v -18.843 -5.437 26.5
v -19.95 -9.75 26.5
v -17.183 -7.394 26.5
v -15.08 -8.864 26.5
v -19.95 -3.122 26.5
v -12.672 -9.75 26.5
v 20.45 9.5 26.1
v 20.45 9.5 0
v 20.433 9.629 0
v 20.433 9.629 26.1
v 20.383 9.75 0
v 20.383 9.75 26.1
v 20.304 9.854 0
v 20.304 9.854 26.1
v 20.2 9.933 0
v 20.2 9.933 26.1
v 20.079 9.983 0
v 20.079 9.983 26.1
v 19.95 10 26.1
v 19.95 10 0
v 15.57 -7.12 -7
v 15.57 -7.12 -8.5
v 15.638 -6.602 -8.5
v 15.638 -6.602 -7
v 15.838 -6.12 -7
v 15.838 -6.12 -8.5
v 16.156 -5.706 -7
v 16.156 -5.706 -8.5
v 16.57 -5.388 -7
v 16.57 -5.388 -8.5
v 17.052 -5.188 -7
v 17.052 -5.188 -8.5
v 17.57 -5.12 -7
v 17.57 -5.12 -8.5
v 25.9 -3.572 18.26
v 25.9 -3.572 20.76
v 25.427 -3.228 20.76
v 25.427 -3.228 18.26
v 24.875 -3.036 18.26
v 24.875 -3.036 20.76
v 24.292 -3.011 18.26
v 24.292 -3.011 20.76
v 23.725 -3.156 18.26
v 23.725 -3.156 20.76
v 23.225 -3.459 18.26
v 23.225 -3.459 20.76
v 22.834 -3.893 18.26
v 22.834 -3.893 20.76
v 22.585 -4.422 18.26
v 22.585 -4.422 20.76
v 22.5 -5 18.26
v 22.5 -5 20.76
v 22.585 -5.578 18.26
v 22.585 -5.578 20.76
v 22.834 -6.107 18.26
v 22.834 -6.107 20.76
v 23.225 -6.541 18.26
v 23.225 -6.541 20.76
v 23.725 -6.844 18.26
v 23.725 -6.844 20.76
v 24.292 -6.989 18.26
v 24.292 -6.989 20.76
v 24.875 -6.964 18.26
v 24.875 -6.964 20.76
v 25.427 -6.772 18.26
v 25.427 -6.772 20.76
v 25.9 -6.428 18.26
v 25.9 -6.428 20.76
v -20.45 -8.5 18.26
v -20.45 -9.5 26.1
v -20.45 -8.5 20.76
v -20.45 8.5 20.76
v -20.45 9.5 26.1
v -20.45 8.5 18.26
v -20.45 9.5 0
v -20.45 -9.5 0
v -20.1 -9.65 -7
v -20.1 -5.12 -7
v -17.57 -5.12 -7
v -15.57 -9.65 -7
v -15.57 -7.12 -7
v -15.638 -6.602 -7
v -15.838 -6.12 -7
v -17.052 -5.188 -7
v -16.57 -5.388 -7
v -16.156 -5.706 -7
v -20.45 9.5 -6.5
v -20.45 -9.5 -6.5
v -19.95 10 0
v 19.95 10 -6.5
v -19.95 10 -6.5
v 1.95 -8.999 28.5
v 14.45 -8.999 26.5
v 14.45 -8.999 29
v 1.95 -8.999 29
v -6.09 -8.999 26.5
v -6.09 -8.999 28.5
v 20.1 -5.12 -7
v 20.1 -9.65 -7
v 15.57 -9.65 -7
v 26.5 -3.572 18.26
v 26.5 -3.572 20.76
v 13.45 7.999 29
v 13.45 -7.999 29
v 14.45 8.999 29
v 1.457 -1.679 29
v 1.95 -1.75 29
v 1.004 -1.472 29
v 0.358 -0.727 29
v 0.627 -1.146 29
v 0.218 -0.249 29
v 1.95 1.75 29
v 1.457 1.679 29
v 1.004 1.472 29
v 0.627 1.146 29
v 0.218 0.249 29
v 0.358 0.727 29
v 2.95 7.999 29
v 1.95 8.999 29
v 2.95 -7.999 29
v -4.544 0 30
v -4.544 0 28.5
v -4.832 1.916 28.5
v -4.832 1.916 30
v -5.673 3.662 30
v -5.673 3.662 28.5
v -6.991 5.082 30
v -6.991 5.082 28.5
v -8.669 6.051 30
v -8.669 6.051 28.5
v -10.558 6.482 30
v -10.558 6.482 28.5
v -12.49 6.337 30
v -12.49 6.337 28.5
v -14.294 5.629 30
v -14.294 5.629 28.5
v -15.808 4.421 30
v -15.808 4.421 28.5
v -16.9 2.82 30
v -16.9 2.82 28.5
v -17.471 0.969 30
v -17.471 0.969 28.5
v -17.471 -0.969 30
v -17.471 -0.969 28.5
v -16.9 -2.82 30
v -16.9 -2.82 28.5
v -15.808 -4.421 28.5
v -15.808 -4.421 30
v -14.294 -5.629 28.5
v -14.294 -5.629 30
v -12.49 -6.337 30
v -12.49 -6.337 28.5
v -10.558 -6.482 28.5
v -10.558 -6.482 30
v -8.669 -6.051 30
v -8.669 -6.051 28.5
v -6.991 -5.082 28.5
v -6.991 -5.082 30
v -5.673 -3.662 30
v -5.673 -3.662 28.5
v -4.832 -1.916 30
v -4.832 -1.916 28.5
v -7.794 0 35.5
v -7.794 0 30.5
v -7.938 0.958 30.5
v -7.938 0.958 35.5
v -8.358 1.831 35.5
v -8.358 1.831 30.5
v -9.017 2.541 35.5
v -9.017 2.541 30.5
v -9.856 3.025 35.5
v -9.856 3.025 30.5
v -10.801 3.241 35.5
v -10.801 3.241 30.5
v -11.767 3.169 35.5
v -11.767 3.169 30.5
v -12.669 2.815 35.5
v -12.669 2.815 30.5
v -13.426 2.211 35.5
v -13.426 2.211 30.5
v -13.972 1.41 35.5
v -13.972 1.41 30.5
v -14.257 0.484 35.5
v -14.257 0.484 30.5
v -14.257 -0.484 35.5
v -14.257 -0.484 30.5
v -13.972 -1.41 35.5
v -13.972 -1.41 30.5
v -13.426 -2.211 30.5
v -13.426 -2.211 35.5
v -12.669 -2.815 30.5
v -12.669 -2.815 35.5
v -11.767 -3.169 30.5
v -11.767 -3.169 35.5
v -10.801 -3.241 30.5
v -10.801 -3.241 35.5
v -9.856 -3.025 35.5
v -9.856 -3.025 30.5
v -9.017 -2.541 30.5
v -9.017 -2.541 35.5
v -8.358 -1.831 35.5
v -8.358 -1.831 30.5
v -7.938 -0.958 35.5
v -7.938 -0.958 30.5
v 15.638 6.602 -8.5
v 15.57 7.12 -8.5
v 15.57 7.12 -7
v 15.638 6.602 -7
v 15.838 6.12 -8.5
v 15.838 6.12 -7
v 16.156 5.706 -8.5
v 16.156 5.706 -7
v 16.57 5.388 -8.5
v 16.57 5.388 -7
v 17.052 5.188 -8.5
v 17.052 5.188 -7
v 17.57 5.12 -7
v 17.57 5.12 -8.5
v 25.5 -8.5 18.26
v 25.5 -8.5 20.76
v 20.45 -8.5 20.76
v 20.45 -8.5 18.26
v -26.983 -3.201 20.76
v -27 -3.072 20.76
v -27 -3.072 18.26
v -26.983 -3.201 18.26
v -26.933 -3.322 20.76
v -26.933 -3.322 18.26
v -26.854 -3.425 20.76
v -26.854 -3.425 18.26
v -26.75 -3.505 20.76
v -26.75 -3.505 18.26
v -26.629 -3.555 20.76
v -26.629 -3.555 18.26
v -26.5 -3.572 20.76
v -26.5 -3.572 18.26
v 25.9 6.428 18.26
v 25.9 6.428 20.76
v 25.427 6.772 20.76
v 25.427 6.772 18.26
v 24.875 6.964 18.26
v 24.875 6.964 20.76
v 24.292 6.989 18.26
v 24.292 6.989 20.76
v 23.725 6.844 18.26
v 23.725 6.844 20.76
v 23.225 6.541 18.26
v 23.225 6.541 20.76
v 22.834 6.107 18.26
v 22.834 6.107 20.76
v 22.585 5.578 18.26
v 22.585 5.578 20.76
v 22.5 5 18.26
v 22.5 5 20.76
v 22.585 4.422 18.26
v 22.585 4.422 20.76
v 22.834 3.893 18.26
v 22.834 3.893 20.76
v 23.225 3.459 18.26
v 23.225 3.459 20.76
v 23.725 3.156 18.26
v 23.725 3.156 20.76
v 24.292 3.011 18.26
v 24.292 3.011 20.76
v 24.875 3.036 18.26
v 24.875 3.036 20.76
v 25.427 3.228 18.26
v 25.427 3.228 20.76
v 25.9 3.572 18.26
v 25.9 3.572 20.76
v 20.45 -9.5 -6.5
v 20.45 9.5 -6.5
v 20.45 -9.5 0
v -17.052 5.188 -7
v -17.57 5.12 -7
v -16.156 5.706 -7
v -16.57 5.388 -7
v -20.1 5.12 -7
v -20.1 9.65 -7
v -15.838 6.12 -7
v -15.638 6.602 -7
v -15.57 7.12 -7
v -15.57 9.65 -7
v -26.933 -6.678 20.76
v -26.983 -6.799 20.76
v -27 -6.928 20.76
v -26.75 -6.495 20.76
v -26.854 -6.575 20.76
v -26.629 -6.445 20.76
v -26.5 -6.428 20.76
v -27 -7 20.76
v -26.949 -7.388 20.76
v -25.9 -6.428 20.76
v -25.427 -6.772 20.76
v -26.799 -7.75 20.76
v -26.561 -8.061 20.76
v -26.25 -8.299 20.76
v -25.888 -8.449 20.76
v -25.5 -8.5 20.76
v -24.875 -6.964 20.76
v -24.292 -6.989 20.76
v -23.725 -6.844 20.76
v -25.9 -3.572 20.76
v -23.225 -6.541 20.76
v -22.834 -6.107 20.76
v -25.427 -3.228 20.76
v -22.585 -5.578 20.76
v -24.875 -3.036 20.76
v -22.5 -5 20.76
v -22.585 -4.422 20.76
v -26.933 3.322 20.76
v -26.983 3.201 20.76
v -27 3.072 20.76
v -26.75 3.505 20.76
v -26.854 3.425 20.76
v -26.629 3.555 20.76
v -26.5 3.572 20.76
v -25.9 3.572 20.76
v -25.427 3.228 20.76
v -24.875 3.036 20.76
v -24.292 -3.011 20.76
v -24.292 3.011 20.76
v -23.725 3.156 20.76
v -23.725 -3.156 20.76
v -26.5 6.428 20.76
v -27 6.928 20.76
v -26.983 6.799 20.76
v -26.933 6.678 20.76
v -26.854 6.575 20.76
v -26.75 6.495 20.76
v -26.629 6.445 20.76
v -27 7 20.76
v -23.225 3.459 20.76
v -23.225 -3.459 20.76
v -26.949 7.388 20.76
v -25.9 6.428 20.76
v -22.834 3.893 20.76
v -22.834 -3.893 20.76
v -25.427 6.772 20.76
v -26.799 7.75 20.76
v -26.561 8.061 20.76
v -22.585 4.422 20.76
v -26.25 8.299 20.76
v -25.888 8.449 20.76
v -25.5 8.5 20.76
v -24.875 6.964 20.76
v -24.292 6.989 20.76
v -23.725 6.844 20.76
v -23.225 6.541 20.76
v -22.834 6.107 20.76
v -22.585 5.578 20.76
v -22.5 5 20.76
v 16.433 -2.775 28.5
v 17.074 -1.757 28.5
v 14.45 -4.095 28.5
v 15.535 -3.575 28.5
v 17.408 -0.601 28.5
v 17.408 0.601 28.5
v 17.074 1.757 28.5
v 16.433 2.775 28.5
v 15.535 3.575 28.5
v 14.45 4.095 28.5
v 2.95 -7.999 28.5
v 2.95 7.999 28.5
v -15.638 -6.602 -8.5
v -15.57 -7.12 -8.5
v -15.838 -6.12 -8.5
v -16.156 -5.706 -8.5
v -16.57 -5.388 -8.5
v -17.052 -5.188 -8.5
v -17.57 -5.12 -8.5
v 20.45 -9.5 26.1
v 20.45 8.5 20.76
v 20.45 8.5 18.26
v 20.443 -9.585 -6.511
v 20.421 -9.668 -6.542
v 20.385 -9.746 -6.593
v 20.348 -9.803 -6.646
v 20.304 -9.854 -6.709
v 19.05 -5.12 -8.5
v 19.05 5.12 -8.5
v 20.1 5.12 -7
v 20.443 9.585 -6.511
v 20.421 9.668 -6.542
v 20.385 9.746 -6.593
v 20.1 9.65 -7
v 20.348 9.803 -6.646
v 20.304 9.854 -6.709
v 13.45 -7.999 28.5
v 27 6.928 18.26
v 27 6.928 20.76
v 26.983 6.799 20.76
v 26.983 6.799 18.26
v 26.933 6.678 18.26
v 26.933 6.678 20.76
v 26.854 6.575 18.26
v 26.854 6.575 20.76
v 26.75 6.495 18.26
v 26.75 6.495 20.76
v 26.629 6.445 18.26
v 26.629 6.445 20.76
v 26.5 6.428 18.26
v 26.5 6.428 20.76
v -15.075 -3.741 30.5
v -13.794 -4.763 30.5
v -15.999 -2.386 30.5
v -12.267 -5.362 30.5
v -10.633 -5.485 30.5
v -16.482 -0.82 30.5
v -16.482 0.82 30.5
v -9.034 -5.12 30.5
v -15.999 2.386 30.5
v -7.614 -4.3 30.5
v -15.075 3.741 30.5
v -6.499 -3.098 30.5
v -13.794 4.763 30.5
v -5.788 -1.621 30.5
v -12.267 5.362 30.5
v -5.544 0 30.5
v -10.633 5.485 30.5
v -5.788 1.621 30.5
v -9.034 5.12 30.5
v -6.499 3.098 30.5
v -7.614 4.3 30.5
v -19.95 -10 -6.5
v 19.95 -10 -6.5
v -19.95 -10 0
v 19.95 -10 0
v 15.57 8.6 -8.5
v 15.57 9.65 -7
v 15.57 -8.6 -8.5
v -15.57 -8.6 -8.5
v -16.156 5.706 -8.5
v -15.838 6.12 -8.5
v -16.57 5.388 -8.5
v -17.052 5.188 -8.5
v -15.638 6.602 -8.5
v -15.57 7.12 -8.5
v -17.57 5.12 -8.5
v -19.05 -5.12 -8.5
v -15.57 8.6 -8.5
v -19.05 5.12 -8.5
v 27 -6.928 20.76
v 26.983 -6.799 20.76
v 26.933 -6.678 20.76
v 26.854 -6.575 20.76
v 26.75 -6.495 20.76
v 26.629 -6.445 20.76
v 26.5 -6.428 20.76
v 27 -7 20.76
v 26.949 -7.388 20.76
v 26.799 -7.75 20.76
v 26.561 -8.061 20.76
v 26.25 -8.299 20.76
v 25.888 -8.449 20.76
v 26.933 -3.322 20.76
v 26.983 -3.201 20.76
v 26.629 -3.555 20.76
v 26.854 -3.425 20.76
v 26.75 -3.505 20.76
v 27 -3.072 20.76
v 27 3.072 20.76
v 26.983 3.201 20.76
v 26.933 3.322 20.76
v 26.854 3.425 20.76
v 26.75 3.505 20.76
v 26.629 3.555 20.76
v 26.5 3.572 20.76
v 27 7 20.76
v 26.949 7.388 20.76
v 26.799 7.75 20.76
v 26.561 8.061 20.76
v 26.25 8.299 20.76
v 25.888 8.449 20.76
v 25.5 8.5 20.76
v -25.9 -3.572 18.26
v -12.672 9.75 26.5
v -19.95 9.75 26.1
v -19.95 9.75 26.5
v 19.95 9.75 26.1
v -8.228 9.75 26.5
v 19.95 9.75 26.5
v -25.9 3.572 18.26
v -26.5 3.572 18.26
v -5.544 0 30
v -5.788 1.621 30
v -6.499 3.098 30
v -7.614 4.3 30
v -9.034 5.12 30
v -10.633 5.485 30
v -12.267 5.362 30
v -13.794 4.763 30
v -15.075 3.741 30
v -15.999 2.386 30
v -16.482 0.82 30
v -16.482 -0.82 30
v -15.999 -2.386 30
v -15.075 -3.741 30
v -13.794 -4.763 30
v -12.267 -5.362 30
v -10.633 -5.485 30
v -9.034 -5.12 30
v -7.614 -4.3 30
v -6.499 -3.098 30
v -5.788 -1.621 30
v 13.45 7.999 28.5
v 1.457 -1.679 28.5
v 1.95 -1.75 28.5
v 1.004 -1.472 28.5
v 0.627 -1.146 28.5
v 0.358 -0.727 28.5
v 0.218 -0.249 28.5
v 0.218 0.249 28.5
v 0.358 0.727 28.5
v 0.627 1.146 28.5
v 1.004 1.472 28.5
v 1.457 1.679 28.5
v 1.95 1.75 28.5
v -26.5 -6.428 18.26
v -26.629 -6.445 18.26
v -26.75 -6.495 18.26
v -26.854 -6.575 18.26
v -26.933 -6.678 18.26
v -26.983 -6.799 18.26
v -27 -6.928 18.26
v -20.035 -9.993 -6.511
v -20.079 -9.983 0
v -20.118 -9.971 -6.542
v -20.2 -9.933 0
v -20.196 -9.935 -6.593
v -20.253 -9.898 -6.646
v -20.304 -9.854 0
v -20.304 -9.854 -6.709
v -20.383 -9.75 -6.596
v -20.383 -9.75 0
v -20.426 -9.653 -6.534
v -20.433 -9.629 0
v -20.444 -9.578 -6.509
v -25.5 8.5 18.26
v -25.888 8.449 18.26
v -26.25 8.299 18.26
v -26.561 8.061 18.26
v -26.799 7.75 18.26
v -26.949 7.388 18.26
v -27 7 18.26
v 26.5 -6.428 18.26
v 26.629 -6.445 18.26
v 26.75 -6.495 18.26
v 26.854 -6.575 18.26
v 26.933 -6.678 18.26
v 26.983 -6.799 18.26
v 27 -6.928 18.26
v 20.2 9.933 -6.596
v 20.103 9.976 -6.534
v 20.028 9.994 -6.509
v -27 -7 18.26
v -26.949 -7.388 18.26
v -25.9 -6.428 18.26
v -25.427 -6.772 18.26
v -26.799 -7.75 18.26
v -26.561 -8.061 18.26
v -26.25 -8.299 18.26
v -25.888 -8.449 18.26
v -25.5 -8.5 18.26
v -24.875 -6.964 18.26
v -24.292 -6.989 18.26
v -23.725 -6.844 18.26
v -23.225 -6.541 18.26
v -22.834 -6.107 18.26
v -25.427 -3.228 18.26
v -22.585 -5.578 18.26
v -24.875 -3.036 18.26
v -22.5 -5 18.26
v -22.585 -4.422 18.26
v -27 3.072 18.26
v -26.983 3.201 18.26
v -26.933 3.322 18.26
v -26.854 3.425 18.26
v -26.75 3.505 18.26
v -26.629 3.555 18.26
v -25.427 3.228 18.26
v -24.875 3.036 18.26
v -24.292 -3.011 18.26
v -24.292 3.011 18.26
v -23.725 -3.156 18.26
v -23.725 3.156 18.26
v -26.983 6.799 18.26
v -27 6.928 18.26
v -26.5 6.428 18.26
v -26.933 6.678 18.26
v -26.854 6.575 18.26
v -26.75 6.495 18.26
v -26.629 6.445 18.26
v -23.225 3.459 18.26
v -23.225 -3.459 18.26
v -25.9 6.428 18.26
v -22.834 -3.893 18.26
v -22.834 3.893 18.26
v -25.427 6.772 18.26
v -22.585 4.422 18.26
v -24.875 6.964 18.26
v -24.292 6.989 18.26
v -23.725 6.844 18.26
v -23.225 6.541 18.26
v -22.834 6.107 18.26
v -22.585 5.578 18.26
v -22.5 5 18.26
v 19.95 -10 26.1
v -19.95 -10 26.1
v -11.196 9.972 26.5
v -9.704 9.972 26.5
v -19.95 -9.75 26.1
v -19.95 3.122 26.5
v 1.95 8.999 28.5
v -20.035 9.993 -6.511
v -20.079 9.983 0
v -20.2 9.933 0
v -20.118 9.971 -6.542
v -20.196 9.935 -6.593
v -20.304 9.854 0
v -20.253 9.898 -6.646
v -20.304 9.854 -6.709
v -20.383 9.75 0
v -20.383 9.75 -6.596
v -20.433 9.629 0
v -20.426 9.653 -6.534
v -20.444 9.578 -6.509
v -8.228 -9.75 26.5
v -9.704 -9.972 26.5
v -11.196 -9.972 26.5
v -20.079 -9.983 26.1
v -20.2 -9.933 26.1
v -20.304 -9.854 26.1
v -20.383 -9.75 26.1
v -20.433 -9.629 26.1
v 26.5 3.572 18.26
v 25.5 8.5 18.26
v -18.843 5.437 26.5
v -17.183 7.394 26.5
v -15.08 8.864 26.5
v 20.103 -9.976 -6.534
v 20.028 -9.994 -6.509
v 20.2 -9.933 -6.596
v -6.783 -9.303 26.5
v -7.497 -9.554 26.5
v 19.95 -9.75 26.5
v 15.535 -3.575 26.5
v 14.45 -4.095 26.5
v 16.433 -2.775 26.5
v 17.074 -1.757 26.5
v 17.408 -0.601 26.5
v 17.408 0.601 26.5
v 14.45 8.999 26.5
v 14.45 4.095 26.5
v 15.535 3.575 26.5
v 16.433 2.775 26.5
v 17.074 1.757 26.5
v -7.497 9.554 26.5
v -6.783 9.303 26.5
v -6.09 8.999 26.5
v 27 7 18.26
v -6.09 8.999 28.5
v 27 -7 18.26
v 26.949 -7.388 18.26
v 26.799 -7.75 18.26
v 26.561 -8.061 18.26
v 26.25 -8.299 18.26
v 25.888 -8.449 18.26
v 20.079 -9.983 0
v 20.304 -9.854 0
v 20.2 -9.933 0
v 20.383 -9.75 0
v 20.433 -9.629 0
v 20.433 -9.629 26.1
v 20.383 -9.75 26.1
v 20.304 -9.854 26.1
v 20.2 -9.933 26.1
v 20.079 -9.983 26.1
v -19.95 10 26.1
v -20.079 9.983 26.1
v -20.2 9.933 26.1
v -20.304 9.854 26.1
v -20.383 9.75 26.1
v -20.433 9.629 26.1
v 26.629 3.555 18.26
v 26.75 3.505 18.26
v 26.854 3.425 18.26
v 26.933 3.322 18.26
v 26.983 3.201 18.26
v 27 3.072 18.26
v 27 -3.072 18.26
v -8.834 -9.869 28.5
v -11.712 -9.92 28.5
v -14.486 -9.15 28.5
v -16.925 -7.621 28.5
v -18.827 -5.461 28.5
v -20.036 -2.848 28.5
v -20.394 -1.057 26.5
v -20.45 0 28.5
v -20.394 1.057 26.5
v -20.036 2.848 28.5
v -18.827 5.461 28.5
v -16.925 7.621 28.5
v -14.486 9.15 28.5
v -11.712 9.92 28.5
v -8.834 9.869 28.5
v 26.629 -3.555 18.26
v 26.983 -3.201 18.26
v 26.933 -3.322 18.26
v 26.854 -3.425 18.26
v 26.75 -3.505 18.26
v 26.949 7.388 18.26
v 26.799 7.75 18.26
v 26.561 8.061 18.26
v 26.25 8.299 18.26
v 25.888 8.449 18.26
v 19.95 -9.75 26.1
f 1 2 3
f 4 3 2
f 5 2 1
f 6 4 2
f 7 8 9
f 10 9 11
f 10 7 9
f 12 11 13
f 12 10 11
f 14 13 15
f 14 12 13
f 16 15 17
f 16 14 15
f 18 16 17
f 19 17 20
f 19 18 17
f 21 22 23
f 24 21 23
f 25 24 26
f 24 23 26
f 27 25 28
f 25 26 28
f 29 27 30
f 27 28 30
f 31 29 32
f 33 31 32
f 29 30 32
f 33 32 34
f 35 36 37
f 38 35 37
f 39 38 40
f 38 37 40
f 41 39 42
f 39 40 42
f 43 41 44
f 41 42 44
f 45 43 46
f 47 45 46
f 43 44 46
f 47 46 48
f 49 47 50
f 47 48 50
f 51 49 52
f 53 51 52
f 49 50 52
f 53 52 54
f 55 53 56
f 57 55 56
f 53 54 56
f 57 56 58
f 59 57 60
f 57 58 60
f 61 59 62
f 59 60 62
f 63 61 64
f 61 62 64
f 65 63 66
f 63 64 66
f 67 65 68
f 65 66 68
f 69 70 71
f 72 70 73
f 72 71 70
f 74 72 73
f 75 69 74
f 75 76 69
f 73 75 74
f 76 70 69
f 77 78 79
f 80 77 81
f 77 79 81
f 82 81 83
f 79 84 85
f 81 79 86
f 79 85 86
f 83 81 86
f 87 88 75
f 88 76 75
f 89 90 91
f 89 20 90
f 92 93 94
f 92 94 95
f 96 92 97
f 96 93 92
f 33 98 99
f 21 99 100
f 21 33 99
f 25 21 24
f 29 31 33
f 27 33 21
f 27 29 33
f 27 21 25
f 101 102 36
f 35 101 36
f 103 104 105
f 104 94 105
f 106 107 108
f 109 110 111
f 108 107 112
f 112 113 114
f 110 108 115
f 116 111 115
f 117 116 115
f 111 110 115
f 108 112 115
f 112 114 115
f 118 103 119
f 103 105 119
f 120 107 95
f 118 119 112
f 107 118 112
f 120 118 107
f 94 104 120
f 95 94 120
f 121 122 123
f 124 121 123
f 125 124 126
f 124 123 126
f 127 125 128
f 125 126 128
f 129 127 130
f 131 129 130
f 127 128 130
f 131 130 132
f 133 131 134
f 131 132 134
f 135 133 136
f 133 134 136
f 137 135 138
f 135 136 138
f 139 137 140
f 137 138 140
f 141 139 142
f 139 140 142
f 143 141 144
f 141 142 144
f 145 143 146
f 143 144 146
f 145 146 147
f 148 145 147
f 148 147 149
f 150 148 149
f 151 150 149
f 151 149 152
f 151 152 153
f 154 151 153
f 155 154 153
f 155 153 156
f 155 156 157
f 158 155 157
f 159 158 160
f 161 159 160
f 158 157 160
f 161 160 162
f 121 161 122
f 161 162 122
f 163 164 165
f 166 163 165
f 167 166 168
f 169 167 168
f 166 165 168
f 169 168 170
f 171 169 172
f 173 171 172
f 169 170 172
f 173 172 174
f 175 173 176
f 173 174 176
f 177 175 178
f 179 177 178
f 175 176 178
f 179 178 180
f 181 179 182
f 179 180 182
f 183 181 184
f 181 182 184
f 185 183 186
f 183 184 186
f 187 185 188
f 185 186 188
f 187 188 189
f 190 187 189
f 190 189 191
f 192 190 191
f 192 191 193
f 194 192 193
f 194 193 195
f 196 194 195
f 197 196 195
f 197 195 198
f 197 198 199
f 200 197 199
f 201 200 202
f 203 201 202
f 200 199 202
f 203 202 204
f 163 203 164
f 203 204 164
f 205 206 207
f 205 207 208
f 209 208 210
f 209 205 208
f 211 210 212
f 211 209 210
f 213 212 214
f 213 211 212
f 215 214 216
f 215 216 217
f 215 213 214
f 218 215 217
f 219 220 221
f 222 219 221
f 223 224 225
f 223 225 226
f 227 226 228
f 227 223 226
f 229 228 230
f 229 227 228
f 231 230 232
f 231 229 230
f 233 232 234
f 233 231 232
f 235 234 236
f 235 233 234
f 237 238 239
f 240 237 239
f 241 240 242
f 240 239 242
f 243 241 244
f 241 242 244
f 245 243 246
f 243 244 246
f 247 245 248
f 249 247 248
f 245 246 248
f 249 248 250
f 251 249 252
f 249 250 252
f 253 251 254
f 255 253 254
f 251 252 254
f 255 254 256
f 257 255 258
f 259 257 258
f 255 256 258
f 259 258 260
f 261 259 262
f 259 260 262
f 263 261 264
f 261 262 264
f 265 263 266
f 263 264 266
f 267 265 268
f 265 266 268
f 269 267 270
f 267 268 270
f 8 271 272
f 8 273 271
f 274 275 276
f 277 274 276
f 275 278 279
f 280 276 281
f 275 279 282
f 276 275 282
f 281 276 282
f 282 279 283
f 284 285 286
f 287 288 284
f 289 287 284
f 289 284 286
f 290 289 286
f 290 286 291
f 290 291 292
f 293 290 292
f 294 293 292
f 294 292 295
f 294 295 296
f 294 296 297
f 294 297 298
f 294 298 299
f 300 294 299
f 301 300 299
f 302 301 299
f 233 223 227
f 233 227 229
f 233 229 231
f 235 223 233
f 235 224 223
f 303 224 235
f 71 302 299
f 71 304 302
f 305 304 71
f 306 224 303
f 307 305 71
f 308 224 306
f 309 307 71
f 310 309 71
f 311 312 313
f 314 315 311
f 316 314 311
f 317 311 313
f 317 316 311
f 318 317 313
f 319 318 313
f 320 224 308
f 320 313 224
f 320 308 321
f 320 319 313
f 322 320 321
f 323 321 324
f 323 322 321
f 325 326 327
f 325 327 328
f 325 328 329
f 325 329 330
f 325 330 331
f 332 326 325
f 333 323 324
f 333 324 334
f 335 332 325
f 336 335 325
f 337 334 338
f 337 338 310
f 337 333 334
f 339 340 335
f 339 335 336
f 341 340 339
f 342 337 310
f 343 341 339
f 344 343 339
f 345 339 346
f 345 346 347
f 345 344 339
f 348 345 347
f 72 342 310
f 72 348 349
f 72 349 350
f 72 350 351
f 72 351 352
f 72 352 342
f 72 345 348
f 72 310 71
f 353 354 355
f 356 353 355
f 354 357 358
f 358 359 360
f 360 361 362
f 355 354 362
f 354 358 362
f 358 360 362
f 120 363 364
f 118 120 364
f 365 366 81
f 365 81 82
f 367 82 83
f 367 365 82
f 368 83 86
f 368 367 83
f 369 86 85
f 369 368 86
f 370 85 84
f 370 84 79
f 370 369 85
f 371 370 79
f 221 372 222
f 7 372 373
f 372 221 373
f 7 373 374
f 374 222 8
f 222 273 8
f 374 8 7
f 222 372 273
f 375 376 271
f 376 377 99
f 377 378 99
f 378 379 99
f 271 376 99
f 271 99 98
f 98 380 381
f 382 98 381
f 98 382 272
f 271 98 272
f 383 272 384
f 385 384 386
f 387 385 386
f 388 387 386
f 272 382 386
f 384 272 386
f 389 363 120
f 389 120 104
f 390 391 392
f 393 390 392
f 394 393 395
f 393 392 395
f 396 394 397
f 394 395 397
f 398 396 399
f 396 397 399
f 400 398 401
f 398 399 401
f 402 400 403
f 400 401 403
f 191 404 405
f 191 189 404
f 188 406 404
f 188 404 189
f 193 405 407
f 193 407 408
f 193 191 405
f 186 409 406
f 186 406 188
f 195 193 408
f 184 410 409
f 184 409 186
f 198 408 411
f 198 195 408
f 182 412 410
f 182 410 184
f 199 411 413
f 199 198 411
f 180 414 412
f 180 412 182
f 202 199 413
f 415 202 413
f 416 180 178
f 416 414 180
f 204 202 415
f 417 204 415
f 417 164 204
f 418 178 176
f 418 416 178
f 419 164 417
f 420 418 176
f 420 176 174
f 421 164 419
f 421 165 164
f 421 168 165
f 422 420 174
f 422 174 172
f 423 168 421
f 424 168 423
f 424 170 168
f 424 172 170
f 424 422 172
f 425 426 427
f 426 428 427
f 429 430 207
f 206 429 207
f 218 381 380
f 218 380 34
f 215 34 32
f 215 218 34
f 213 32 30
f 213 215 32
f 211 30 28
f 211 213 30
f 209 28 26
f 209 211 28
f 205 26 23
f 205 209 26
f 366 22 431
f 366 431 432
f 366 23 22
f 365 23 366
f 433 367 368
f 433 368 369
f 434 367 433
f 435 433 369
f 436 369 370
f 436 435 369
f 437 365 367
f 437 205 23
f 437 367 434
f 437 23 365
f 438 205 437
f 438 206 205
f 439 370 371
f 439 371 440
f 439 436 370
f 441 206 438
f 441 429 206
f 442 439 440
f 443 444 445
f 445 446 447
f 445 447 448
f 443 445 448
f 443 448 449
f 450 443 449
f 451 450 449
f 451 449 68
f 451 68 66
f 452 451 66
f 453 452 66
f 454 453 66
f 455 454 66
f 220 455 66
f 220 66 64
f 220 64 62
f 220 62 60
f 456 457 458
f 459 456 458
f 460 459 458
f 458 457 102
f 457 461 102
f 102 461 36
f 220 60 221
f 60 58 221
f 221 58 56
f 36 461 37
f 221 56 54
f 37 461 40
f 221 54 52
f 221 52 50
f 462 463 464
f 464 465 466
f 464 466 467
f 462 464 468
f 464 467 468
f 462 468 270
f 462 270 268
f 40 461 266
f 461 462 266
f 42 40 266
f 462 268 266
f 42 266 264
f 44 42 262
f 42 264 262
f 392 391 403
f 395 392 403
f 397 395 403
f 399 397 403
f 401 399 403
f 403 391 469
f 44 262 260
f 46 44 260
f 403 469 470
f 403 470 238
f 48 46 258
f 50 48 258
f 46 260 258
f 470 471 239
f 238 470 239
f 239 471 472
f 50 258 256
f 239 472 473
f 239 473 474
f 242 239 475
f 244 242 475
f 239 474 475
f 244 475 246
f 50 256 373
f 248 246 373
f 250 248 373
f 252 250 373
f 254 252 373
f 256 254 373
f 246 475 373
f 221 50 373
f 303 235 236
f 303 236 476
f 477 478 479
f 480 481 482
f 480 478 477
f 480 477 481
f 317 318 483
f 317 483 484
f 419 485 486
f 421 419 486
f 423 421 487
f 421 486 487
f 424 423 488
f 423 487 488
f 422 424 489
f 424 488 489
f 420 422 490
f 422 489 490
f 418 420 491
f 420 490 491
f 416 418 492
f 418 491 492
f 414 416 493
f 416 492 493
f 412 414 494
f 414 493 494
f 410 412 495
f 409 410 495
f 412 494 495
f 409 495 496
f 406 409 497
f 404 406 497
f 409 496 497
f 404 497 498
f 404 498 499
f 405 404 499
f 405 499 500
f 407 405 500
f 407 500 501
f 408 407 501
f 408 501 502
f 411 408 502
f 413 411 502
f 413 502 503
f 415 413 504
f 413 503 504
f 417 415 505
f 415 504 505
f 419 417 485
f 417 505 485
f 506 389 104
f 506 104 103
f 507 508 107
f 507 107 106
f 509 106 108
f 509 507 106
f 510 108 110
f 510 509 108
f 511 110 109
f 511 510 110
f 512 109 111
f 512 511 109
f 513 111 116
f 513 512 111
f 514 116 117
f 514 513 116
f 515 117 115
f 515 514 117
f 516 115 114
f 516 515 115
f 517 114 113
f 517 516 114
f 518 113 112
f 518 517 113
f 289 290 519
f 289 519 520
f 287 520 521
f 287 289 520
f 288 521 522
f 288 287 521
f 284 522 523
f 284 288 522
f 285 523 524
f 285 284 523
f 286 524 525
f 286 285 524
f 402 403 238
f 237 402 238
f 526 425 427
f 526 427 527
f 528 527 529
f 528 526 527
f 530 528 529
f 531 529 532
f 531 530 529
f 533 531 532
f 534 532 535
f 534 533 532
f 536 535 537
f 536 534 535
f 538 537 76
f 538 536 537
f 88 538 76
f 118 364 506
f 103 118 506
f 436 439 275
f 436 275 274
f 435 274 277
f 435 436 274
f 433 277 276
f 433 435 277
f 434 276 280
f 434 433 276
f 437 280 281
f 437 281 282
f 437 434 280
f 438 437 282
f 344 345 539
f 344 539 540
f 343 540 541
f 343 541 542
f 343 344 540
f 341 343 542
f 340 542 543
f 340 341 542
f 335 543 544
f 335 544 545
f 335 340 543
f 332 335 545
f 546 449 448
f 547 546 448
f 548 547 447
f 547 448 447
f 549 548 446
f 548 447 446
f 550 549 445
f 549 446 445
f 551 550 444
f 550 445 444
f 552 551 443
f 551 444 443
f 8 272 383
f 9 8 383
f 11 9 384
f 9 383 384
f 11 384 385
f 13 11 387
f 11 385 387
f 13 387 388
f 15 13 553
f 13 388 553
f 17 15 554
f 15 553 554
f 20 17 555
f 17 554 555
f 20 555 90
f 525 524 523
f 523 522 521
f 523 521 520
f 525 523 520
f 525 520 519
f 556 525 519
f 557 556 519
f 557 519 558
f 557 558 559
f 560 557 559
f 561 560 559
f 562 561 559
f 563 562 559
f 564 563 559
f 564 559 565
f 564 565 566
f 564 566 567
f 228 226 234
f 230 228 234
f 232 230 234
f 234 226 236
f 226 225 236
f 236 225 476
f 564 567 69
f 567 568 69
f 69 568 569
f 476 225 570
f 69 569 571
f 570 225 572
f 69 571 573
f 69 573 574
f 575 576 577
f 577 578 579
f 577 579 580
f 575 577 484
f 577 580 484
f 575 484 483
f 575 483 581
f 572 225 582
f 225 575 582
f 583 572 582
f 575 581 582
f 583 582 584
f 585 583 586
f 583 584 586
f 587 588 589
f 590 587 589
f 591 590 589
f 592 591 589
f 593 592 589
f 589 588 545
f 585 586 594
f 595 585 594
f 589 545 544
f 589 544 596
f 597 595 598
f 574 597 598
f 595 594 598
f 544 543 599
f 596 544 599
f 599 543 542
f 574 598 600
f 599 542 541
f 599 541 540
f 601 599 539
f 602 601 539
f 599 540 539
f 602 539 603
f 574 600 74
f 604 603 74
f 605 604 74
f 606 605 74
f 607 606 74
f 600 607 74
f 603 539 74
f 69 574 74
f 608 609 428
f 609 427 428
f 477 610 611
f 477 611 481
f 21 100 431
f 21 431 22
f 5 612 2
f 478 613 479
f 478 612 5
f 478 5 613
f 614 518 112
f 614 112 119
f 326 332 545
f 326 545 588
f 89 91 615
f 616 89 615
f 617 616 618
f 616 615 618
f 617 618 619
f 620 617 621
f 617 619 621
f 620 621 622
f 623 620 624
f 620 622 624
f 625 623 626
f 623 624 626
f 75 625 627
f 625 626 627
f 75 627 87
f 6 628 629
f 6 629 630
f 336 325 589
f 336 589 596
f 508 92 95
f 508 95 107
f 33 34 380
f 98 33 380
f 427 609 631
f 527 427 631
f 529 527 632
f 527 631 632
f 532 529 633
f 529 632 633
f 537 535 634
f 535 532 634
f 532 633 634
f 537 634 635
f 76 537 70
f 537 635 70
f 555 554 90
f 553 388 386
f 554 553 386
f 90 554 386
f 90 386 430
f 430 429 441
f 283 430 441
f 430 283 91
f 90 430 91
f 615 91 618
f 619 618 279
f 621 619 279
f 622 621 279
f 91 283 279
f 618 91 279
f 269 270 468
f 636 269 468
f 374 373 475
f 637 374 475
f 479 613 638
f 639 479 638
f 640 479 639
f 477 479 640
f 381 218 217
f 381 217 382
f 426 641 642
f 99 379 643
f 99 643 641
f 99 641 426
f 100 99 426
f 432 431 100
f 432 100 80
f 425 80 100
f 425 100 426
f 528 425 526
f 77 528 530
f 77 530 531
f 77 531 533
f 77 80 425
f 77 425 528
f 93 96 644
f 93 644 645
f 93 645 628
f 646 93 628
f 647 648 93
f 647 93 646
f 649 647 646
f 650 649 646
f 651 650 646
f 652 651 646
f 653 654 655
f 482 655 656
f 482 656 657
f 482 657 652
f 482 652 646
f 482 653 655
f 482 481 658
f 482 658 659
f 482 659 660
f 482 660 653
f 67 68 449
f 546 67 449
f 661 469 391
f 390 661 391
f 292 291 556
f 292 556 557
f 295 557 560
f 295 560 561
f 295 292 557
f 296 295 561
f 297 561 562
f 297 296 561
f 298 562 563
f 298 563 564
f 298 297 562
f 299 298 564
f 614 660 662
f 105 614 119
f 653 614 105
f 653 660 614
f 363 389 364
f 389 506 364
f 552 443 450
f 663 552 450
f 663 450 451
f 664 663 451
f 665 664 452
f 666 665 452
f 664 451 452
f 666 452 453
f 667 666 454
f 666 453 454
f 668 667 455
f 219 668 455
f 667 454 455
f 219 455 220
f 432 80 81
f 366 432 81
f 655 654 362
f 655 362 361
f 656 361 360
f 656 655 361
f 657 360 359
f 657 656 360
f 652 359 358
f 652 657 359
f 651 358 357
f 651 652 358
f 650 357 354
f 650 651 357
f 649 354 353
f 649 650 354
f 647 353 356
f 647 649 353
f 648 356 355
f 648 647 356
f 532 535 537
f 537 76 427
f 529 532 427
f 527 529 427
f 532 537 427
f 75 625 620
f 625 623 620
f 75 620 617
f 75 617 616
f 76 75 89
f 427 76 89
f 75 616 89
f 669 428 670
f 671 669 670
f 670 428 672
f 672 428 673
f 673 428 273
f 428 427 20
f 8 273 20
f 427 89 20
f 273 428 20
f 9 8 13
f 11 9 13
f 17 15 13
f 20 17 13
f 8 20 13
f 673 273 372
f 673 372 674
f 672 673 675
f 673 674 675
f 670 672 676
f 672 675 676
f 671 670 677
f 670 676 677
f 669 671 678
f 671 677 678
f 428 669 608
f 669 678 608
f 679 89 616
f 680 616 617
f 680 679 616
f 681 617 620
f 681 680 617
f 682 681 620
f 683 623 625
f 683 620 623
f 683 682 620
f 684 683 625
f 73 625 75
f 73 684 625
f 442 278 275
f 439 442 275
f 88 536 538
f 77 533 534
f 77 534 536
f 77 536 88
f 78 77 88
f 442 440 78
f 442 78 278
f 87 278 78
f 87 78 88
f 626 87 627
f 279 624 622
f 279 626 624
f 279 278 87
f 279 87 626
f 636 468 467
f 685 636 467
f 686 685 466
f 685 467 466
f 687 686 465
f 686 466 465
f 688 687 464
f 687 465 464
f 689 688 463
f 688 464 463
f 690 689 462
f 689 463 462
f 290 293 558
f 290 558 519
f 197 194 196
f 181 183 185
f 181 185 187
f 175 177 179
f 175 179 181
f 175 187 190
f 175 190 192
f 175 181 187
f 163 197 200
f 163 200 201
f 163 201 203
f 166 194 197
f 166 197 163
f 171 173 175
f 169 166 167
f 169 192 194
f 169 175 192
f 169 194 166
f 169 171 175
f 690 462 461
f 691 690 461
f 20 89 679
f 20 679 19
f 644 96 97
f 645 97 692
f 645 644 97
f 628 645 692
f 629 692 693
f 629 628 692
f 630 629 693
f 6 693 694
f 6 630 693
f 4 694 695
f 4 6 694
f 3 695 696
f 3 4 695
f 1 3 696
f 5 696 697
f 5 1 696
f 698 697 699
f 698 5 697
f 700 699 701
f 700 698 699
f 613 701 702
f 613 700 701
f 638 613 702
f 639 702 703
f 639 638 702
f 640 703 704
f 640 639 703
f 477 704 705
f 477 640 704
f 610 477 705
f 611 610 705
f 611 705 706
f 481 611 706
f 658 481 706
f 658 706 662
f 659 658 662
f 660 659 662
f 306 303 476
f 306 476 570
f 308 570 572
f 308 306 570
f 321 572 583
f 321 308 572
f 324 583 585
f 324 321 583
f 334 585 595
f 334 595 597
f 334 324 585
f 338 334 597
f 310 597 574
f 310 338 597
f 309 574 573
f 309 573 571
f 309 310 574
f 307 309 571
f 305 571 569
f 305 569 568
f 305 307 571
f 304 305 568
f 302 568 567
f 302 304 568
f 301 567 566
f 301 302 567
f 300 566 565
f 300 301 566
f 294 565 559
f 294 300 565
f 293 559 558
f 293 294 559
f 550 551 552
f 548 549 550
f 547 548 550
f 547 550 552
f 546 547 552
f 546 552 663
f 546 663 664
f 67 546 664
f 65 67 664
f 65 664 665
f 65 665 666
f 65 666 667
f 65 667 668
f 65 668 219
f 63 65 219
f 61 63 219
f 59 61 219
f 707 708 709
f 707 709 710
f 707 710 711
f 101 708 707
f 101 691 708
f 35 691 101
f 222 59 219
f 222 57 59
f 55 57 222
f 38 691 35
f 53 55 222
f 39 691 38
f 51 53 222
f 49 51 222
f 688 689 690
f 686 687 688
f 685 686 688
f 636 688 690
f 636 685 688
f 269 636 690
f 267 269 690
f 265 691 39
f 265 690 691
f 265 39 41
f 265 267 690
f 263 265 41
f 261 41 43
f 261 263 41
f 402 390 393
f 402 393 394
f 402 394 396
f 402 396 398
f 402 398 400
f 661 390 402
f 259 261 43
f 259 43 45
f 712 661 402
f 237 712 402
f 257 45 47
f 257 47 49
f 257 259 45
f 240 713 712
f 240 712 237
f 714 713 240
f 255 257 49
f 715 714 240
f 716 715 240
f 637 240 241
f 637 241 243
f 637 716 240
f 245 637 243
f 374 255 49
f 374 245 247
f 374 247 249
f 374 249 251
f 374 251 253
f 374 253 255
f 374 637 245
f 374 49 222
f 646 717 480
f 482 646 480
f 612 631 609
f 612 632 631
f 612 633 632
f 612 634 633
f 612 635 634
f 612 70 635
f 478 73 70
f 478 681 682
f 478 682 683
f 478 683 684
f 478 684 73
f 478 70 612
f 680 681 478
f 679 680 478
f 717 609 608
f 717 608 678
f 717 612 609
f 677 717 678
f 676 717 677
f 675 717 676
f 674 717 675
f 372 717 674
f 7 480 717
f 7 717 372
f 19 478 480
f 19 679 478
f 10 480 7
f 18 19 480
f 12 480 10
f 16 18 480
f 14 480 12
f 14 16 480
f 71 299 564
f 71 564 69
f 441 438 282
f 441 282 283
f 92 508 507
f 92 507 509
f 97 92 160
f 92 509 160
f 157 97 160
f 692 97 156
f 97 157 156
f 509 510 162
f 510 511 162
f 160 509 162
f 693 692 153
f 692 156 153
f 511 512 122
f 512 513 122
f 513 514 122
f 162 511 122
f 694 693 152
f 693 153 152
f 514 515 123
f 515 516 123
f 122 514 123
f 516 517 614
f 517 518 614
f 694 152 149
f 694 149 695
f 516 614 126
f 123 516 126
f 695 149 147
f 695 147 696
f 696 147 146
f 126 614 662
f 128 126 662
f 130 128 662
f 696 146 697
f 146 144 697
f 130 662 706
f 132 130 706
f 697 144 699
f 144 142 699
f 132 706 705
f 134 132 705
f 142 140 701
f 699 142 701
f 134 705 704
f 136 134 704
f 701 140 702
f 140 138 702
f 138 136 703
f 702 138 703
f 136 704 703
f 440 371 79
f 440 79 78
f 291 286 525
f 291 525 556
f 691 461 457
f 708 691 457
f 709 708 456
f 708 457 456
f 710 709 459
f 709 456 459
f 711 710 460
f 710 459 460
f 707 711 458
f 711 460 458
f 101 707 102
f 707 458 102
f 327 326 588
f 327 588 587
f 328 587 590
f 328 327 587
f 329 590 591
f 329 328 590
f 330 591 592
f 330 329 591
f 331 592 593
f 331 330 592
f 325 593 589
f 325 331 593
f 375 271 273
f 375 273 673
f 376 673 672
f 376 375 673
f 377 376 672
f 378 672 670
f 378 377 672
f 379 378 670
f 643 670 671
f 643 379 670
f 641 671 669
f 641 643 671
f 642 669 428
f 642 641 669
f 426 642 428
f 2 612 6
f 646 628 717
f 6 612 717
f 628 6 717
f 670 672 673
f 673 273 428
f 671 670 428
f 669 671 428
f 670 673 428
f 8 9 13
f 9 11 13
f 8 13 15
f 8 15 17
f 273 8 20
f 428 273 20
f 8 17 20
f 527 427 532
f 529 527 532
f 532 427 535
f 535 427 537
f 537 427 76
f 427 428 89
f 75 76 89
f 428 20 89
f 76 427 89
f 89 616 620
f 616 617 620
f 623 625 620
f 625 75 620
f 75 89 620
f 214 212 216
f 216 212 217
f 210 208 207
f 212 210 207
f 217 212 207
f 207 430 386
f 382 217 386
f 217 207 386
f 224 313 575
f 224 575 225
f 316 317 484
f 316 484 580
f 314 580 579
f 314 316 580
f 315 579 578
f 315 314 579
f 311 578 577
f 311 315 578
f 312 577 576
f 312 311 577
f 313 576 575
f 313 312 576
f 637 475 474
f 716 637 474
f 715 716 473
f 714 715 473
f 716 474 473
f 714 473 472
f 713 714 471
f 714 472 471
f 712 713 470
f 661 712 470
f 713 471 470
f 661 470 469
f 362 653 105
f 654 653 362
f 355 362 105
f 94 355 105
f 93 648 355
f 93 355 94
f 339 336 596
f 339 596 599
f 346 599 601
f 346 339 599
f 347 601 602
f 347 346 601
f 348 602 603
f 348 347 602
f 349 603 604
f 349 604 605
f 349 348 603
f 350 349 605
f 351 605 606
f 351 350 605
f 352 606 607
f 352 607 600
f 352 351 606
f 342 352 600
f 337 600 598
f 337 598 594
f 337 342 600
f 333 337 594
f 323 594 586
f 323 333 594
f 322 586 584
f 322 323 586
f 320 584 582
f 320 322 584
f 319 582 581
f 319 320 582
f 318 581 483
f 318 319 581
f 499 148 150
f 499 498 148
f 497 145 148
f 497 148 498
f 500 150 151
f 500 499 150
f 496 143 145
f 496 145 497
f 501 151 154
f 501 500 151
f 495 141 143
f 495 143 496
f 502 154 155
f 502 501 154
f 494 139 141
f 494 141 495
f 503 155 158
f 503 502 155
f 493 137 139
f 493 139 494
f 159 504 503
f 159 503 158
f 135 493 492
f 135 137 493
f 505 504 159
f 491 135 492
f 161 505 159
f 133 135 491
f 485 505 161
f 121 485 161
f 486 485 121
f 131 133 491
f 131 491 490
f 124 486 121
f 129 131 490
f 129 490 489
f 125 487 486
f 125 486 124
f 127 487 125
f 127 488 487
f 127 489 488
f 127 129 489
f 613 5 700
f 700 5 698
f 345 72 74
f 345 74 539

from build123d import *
from OCP.BRepFilletAPI import BRepFilletAPI_MakeChamfer

# Parameters (mm, degrees)
SKETCH1_W            = 40.9
SKETCH1_H            = 20
BOSS_EXTRUDE1_DEPTH  = 19.3
SKETCH2_W            = 40.9
SKETCH2_H            = 20
BOSS_EXTRUDE2_DEPTH  = 6.8
SKETCH3_W            = 40.9
SKETCH3_H            = 20
BOSS_EXTRUDE3_DEPTH  = 8.5
CHAMFER1_SIZE        = 2
CHAMFER1_SIZE2       = 1.400415076
CUT_EXTRUDE1_DEPTH   = 1.5
SKETCH5_W            = 39.9
SKETCH5_H            = 19.5
BOSS_EXTRUDE4_DEPTH  = 0.4
BOSS_EXTRUDE5_DEPTH  = 2
SKETCH7_R            = 6.5
BOSS_EXTRUDE6_DEPTH  = 1.5
SKETCH8_R            = 5.5
BOSS_EXTRUDE7_DEPTH  = 0.5
SKETCH9_R            = 3.25
BOSS_EXTRUDE8_DEPTH  = 5
SKETCH10_W           = 10.5
SKETCH10_H           = 15.998933302
BOSS_EXTRUDE9_DEPTH  = 0.5
FILLET1_R            = 0.5
FILLET2_R            = 0.5
FILLET4_R            = 0.5
BOSS_EXTRUDE10_START = -5.74
BOSS_EXTRUDE10_DEPTH = 2.5


with BuildPart() as part:
    # Sketch1 → Boss-Extrude1 (new body)
    with BuildSketch(Plane.XY):
        Rectangle(SKETCH1_W, SKETCH1_H)
    extrude(amount=BOSS_EXTRUDE1_DEPTH)

    # Fillet1
    fillet1_edges = [part.edges().sort_by_distance(p)[0] for p in [
        (20.45, -10, 9.65),
        (-20.45, -10, 9.65),
        (-20.45, 10, 9.65),
        (20.45, 10, 9.65),
    ]]
    fillet(fillet1_edges, radius=FILLET1_R)



with BuildPart() as body_2:
    # Sketch2 → Boss-Extrude2 (new body)
    with BuildSketch(Plane.XY.offset(19.3)):
        Rectangle(SKETCH2_W, SKETCH2_H)
    extrude(amount=BOSS_EXTRUDE2_DEPTH)

    # Sketch5 → Boss-Extrude4 (add)
    with BuildSketch(Plane.XY.offset(26.1)):
        Rectangle(SKETCH5_W, SKETCH5_H)
    extrude(amount=BOSS_EXTRUDE4_DEPTH)

    # Sketch6 → Boss-Extrude5 (add)
    with BuildSketch(Plane.XY.offset(26.5)):
        with BuildLine():
            Line((-6.09, 8.999466651), (14.45, 8.999466651))
            Line((14.45, 8.999466651), (14.45, 4.095176826))
            ThreePointArc((14.45, 4.095176826), (17.45, 0), (14.45, -4.095176826))
            Line((14.45, -4.095176826), (14.45, -8.999466651))
            Line((14.45, -8.999466651), (-6.09, -8.999466651))
            ThreePointArc((-6.09, -8.999466651), (-20.45, 0), (-6.09, 8.999466651))
        make_face()
    extrude(amount=BOSS_EXTRUDE5_DEPTH)

    # Sketch7 → Boss-Extrude6 (add)
    with BuildSketch(Plane.XY.offset(28.5)):
        with Locations((-11.043616273, 0)):
            Circle(SKETCH7_R)
    extrude(amount=BOSS_EXTRUDE6_DEPTH)

    # Sketch8 → Boss-Extrude7 (add)
    with BuildSketch(Plane.XY.offset(30)):
        with Locations((-11.043616273, 0)):
            Circle(SKETCH8_R)
    extrude(amount=BOSS_EXTRUDE7_DEPTH)

    # Sketch9 → Boss-Extrude8 (add)
    with BuildSketch(Plane.XY.offset(30.5)):
        with Locations((-11.043616273, 0)):
            Circle(SKETCH9_R)
    extrude(amount=BOSS_EXTRUDE8_DEPTH)

    # Sketch10 → Boss-Extrude9 (add)
    with BuildSketch(Plane.XY.offset(28.5)):
        with BuildLine():
            Line((1.95, 8.999466651), (14.45, 8.999466651))
            Line((14.45, 8.999466651), (14.45, -8.999466651))
            Line((14.45, -8.999466651), (1.95, -8.999466651))
            Line((1.95, -8.999466651), (1.95, -1.75))
            ThreePointArc((1.95, -1.75), (0.2, 0), (1.95, 1.75))
            Line((1.95, 1.75), (1.95, 8.999466651))
        make_face()
        with Locations((8.2, 0)):
            Rectangle(SKETCH10_W, SKETCH10_H, mode=Mode.SUBTRACT)
    extrude(amount=BOSS_EXTRUDE9_DEPTH)

    # Fillet2
    fillet2_edges = [body_2.edges().sort_by_distance(p)[0] for p in [
        (-20.45, -10, 22.7),
        (-20.45, 10, 22.7),
        (20.45, 10, 22.7),
        (20.45, -10, 22.7),
    ]]
    fillet(fillet2_edges, radius=FILLET2_R)


with BuildPart() as body_3:
    # Sketch3 → Boss-Extrude3 (new body)
    with BuildSketch(Plane(origin=(0, 0, 0), x_dir=(-1, 0, 0), z_dir=(0, 0, -1))):
        Rectangle(SKETCH3_W, SKETCH3_H)
    extrude(amount=BOSS_EXTRUDE3_DEPTH)

    # Chamfer1: one chamfer whose edges measure the first distance from different faces: ONE call of the kernel's chamfer builder (chamfer() names one face for all edges)
    chamfer1_edges_1 = [body_3.edges().sort_by_distance(p)[0] for p in [
        (0, -10, -8.5),
    ]]
    chamfer1_side_1 = [body_3.faces().sort_by_distance(p)[0] for p in [
        (0, -10, -4.25),
    ]]
    chamfer1_edges_2 = [body_3.edges().sort_by_distance(p)[0] for p in [
        (-20.45, 0, -8.5),
    ]]
    chamfer1_side_2 = [body_3.faces().sort_by_distance(p)[0] for p in [
        (-20.45, 0, -4.25),
    ]]
    chamfer1_edges_3 = [body_3.edges().sort_by_distance(p)[0] for p in [
        (0, 10, -8.5),
    ]]
    chamfer1_side_3 = [body_3.faces().sort_by_distance(p)[0] for p in [
        (0, 10, -4.25),
    ]]
    chamfer1_edges_4 = [body_3.edges().sort_by_distance(p)[0] for p in [
        (20.45, 0, -8.5),
    ]]
    chamfer1_side_4 = [body_3.faces().sort_by_distance(p)[0] for p in [
        (20.45, 0, -4.25),
    ]]
    chamfer1 = BRepFilletAPI_MakeChamfer(body_3.part.solid().wrapped)
    for e in chamfer1_edges_1:
        chamfer1.Add(CHAMFER1_SIZE, CHAMFER1_SIZE2, e.wrapped, chamfer1_side_1[0].wrapped)  # the first distance lies on this face
    for e in chamfer1_edges_2:
        chamfer1.Add(CHAMFER1_SIZE, CHAMFER1_SIZE2, e.wrapped, chamfer1_side_2[0].wrapped)  # the first distance lies on this face
    for e in chamfer1_edges_3:
        chamfer1.Add(CHAMFER1_SIZE, CHAMFER1_SIZE2, e.wrapped, chamfer1_side_3[0].wrapped)  # the first distance lies on this face
    for e in chamfer1_edges_4:
        chamfer1.Add(CHAMFER1_SIZE, CHAMFER1_SIZE2, e.wrapped, chamfer1_side_4[0].wrapped)  # the first distance lies on this face
    add(Compound.cast(chamfer1.Shape()), mode=Mode.REPLACE)

    # Sketch4 → Cut-Extrude1 (cut)
    with BuildSketch(Plane(origin=(0, 0, -8.5), x_dir=(-1, 0, 0), z_dir=(0, 0, -1))):
        with BuildLine():
            Line((-20.45, 10), (-15.57, 10))
            Line((-15.57, 10), (-15.57, 7.12))
            ThreePointArc((-15.57, 7.12), (-16.155786438, 5.705786438), (-17.57, 5.12))
            Line((-17.57, 5.12), (-20.45, 5.12))
            Line((-20.45, 5.12), (-20.45, 10))
        make_face()
        with BuildLine():
            Line((20.45, 5.12), (17.57, 5.12))
            ThreePointArc((17.57, 5.12), (16.155786438, 5.705786438), (15.57, 7.12))
            Line((15.57, 7.12), (15.57, 10))
            Line((15.57, 10), (20.45, 10))
            Line((20.45, 10), (20.45, 5.12))
        make_face()
        with BuildLine():
            Line((15.57, -10), (15.57, -7.12))
            ThreePointArc((15.57, -7.12), (16.155786438, -5.705786438), (17.57, -5.12))
            Line((17.57, -5.12), (20.45, -5.12))
            Line((20.45, -5.12), (20.45, -10))
            Line((20.45, -10), (15.57, -10))
        make_face()
        with BuildLine():
            Line((-15.57, -10), (-15.57, -7.12))
            ThreePointArc((-15.57, -7.12), (-16.155786438, -5.705786438), (-17.57, -5.12))
            Line((-17.57, -5.12), (-20.45, -5.12))
            Line((-20.45, -5.12), (-20.45, -10))
            Line((-20.45, -10), (-15.57, -10))
        make_face()
    extrude(amount=-CUT_EXTRUDE1_DEPTH, mode=Mode.SUBTRACT)

    # Fillet4
    fillet4_edges = [body_3.edges().sort_by_distance(p)[0] for p in [
        (-20.45, 10, -3.25),
        (-20.45, -10, -3.25),
        (20.45, -10, -3.25),
        (20.45, 10, -3.25),
    ]]
    fillet(fillet4_edges, radius=FILLET4_R)


with BuildPart() as part_1:
    add(part.part)

    add(body_2.part)  # Boss-Extrude10 merges body 2
    # Sketch11 → Boss-Extrude10 (add)
    with BuildSketch(Plane.XY.offset(26.5).offset(BOSS_EXTRUDE10_START)):
        with BuildLine():
            Line((20.45, 8.5), (25.5, 8.5))
            ThreePointArc((25.5, 8.5), (26.560660172, 8.060660172), (27, 7))
            Line((27, 7), (27, 6.928285686))
            ThreePointArc((27, 6.928285686), (26.853553391, 6.574732295), (26.5, 6.428285686))
            Line((26.5, 6.428285686), (25.9, 6.428285686))
            ThreePointArc((25.9, 6.428285686), (22.5, 5), (25.9, 3.571714314))
            Line((25.9, 3.571714314), (26.5, 3.571714314))
            ThreePointArc((26.5, 3.571714314), (26.853553391, 3.425267705), (27, 3.071714314))
            Line((27, 3.071714314), (27, -3.071714314))
            ThreePointArc((27, -3.071714314), (26.853553391, -3.425267705), (26.5, -3.571714314))
            Line((26.5, -3.571714314), (25.9, -3.571714314))
            ThreePointArc((25.9, -3.571714314), (22.5, -5), (25.9, -6.428285686))
            Line((25.9, -6.428285686), (26.5, -6.428285686))
            ThreePointArc((26.5, -6.428285686), (26.853553391, -6.574732295), (27, -6.928285686))
            Line((27, -6.928285686), (27, -7))
            ThreePointArc((27, -7), (26.560660172, -8.060660172), (25.5, -8.5))
            Line((25.5, -8.5), (20.45, -8.5))
            Line((20.45, -8.5), (20.45, 8.5))
        make_face()
    boss_extrude10 = extrude(amount=-BOSS_EXTRUDE10_DEPTH)

    # Mirror1: Boss-Extrude10 across plane
    add(boss_extrude10.mirror(Plane(origin=(0, 0, 0), x_dir=(0, 0, 1), z_dir=(1, 0, 0))))


solid = Compound([body_3.part, part_1.part])
